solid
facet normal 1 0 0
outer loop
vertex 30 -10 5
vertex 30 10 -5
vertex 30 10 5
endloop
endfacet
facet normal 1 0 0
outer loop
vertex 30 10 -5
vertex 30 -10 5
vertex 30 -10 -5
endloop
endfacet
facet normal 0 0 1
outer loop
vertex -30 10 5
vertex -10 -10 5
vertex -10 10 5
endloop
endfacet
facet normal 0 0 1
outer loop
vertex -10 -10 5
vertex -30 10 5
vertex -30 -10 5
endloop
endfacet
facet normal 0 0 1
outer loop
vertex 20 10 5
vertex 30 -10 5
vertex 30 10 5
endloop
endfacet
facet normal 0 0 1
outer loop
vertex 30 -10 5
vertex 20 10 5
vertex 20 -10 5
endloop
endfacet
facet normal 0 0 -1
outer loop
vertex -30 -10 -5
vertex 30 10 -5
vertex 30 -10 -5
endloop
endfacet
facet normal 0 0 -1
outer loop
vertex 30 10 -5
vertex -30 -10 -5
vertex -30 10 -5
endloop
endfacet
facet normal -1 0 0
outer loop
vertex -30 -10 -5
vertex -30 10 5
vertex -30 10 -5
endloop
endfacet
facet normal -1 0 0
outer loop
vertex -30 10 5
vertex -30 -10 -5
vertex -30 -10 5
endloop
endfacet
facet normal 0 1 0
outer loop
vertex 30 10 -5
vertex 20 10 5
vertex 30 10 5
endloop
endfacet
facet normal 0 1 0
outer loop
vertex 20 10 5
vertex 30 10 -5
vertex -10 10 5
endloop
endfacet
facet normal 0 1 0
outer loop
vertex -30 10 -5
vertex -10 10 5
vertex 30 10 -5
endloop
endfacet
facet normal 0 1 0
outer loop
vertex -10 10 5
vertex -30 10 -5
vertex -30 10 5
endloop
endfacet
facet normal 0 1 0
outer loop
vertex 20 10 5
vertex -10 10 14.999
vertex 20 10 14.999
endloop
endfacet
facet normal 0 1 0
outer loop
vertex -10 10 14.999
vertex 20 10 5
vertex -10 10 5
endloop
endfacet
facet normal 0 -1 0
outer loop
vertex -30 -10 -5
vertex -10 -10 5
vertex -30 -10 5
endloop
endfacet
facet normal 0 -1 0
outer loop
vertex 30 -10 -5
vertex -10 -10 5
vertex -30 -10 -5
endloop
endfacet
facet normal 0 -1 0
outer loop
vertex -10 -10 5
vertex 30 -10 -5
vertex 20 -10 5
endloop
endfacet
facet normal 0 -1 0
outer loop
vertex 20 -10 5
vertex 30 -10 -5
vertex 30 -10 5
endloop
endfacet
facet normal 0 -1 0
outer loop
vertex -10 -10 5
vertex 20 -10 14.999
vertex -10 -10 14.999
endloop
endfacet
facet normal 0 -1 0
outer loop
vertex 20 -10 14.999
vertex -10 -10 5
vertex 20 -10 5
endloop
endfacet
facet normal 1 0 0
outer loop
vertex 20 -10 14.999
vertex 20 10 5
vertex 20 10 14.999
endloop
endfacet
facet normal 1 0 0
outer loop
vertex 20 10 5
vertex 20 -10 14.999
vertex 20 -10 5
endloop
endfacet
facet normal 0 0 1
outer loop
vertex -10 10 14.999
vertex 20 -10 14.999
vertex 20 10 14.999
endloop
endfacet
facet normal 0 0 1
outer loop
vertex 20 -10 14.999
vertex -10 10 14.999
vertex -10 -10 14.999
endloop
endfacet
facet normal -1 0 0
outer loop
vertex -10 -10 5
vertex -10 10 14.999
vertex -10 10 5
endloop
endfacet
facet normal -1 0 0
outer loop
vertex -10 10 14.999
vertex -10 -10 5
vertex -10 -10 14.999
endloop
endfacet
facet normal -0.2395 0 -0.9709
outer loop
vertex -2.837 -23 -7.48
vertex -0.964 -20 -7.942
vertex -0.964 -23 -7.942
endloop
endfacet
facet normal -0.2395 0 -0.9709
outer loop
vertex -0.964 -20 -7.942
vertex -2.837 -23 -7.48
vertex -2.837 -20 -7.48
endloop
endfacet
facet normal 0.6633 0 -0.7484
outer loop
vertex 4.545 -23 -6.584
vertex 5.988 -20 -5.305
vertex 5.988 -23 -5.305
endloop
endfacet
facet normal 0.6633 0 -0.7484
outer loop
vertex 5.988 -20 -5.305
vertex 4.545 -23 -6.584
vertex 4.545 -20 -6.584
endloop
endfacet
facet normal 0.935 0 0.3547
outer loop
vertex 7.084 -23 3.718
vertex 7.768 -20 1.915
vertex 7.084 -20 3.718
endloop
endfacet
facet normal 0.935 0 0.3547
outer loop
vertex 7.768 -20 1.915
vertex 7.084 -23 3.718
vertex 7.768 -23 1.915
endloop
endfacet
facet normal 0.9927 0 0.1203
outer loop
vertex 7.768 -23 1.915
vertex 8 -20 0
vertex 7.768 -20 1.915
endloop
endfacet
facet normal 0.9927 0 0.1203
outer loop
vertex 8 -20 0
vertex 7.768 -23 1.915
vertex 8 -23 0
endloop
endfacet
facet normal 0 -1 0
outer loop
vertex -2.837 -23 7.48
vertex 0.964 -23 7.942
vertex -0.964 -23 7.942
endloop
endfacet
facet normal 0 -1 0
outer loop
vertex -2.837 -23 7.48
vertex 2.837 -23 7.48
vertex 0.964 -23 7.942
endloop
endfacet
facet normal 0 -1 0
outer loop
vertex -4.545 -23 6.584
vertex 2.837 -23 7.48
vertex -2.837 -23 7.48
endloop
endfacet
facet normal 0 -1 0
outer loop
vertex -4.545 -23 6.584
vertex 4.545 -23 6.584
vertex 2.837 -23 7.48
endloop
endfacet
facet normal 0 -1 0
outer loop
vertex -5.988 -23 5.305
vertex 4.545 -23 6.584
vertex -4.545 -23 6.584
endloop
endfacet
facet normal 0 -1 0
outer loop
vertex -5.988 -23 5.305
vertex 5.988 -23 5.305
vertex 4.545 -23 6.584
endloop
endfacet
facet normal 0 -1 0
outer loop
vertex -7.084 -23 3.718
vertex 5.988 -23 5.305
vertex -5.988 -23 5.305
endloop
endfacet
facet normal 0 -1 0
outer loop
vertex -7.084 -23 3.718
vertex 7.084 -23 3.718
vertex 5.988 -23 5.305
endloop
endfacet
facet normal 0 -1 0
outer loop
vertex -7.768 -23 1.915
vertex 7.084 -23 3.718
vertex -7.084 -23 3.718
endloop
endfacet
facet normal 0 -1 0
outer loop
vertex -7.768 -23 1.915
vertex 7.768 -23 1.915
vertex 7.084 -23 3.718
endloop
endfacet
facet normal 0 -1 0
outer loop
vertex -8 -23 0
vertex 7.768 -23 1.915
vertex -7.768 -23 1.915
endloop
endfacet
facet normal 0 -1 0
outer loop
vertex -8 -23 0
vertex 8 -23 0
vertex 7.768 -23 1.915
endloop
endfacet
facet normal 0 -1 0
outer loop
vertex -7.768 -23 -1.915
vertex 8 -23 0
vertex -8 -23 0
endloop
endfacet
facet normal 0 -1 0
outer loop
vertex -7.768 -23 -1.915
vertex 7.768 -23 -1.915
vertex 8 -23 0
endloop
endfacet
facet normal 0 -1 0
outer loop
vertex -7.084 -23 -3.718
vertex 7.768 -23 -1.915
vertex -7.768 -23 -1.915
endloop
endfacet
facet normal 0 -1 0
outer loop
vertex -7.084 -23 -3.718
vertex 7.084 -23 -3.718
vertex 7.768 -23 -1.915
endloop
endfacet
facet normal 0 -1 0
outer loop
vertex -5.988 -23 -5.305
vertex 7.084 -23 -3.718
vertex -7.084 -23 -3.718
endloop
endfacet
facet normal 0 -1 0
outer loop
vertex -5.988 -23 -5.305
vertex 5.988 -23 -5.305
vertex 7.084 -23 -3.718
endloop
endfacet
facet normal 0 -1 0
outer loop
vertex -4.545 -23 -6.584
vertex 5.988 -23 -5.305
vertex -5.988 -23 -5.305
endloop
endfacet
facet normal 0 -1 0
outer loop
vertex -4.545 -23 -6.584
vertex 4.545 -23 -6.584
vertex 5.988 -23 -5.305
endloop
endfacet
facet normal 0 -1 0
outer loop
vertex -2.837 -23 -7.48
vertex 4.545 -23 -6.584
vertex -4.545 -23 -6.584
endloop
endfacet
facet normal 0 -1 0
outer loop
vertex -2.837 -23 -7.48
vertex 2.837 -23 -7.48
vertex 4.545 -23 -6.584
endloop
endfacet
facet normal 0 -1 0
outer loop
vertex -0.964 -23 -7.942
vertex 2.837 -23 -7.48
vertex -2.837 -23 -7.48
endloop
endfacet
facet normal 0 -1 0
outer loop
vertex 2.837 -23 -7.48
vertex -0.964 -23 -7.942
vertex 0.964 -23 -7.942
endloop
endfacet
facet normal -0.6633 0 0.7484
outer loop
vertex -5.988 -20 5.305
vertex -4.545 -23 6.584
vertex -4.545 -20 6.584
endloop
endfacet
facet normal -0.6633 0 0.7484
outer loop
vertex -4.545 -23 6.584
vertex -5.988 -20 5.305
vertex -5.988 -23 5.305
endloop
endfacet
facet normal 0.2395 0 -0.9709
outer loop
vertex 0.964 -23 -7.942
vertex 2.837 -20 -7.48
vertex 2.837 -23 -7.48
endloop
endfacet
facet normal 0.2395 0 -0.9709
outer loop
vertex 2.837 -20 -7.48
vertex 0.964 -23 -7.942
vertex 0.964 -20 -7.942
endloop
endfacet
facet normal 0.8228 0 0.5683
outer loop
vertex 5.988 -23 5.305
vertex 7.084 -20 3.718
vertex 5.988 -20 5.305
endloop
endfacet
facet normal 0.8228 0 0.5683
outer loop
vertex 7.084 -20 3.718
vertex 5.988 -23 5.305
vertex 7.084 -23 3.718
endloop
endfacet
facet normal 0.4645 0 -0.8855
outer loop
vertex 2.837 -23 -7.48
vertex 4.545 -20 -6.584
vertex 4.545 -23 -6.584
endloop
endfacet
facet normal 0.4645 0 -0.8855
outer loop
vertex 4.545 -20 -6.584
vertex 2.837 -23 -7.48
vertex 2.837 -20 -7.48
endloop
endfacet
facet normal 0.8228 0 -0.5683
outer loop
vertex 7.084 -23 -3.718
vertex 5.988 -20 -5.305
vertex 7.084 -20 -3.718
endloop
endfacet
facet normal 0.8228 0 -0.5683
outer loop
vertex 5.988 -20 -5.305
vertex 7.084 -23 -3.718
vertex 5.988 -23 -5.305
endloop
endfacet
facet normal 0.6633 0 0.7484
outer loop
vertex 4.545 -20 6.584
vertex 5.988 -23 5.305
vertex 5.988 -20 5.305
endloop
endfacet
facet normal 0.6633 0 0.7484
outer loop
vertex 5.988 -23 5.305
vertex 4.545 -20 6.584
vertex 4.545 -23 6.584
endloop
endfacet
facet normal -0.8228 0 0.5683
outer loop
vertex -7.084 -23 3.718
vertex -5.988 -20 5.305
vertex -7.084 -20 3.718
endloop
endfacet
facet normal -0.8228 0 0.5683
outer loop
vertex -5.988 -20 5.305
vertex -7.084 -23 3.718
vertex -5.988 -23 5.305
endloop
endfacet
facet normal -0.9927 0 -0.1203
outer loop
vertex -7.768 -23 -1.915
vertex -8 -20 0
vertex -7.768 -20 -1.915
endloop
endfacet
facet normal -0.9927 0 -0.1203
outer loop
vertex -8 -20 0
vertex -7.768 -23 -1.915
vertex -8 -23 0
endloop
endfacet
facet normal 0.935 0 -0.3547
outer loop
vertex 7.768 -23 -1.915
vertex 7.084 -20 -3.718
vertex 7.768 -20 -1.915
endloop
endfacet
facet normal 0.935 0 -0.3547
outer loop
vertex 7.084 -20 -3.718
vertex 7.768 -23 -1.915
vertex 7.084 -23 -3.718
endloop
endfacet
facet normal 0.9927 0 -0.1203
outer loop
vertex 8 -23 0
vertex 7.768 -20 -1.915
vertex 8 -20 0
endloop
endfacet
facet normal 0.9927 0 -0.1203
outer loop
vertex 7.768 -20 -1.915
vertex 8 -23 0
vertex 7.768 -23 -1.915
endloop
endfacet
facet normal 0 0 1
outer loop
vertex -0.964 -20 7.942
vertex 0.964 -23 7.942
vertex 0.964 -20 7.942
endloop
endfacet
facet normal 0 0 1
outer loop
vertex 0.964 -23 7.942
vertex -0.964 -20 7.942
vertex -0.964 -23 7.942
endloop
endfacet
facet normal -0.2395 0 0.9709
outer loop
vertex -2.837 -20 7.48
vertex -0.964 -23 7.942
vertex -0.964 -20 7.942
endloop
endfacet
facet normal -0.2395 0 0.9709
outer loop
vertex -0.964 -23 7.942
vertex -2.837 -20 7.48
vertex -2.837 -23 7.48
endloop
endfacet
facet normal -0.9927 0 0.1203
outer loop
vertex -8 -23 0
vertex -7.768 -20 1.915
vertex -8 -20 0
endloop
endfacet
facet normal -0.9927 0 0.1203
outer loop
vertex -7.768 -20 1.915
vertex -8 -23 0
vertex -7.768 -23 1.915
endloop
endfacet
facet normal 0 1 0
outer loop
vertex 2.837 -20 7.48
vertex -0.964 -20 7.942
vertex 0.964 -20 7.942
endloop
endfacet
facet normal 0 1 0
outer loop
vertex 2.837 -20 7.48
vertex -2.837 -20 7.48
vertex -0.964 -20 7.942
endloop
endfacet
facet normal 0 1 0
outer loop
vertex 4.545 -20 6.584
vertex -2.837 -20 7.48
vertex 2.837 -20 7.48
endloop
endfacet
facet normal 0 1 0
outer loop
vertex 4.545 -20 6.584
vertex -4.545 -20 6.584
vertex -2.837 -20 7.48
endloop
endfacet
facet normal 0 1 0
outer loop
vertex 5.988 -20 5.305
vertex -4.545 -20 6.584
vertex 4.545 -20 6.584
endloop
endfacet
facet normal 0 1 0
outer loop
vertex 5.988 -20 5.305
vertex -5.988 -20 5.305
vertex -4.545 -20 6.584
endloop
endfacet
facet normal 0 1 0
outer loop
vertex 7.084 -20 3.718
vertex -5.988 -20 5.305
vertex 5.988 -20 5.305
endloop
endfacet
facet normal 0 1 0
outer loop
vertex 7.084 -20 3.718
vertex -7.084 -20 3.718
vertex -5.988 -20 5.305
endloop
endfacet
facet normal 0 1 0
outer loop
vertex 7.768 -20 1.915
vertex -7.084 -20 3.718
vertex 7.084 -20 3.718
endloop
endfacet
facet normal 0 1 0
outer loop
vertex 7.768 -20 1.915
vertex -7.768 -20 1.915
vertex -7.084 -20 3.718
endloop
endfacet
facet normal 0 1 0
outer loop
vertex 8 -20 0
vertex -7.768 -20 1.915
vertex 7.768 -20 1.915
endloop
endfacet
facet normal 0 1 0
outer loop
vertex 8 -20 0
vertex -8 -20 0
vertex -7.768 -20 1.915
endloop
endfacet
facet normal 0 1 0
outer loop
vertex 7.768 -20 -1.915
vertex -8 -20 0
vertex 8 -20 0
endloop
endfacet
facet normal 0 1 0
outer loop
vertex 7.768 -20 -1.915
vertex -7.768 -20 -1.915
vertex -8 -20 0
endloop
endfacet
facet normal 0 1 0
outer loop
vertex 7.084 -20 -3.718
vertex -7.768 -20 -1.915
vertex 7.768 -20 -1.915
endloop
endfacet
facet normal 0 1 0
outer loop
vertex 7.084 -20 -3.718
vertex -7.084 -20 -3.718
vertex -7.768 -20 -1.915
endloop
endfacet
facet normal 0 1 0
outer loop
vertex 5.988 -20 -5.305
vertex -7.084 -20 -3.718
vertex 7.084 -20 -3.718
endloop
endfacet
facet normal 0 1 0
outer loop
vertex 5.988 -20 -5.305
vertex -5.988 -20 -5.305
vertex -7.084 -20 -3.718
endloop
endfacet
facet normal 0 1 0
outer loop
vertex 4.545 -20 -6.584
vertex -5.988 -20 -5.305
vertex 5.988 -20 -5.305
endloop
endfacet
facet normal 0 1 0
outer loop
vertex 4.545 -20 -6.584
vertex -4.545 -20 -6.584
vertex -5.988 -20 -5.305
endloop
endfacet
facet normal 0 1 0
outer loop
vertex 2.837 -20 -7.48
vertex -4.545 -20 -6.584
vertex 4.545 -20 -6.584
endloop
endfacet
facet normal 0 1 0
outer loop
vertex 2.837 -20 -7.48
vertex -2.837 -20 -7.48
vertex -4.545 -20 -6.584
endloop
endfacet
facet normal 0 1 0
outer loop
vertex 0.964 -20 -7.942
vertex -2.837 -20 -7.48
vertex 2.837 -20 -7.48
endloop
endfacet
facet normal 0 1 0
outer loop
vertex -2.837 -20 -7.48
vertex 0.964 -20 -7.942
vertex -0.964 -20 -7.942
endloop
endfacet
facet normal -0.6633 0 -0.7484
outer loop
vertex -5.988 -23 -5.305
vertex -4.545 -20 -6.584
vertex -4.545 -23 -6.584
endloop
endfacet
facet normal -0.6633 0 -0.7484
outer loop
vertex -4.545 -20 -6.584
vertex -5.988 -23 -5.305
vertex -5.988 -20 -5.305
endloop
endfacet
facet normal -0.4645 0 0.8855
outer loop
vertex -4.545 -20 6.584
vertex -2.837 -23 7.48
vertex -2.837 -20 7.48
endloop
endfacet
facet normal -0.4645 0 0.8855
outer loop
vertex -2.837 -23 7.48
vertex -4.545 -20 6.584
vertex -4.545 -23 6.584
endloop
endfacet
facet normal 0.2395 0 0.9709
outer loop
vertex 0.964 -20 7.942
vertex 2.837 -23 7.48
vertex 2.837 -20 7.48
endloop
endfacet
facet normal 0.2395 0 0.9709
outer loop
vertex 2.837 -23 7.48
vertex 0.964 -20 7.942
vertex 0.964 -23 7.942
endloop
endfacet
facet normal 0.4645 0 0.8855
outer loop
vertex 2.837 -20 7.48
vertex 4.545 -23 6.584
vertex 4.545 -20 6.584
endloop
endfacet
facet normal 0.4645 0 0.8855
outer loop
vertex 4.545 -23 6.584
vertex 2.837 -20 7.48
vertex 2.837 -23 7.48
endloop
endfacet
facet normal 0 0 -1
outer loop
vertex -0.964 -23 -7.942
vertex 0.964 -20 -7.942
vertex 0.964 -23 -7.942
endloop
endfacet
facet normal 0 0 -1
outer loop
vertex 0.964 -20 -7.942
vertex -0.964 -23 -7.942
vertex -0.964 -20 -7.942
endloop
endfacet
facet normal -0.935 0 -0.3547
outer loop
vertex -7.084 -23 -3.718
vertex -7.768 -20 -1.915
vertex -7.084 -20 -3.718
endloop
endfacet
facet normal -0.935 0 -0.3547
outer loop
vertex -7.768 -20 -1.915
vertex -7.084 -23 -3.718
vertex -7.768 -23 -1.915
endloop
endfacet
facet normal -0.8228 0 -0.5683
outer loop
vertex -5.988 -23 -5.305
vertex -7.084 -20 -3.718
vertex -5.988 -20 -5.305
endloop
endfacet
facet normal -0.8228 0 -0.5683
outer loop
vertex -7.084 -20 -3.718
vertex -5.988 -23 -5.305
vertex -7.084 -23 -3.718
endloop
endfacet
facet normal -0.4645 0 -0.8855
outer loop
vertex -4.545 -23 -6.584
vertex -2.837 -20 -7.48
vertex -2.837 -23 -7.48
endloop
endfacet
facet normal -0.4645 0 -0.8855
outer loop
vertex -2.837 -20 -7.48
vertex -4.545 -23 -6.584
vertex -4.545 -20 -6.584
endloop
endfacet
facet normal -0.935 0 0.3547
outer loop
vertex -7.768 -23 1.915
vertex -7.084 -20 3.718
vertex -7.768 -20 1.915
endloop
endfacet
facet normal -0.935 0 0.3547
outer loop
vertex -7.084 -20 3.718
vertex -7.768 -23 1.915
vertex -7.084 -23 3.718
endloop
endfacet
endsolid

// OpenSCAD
cube([60,20,10],center=true);
translate([5,0,10 - 0.001])
    cube([30,20,10],center=true);
translate([0,-20,0])
    rotate([90,0,0])
    cylinder(h=3,r=8);
